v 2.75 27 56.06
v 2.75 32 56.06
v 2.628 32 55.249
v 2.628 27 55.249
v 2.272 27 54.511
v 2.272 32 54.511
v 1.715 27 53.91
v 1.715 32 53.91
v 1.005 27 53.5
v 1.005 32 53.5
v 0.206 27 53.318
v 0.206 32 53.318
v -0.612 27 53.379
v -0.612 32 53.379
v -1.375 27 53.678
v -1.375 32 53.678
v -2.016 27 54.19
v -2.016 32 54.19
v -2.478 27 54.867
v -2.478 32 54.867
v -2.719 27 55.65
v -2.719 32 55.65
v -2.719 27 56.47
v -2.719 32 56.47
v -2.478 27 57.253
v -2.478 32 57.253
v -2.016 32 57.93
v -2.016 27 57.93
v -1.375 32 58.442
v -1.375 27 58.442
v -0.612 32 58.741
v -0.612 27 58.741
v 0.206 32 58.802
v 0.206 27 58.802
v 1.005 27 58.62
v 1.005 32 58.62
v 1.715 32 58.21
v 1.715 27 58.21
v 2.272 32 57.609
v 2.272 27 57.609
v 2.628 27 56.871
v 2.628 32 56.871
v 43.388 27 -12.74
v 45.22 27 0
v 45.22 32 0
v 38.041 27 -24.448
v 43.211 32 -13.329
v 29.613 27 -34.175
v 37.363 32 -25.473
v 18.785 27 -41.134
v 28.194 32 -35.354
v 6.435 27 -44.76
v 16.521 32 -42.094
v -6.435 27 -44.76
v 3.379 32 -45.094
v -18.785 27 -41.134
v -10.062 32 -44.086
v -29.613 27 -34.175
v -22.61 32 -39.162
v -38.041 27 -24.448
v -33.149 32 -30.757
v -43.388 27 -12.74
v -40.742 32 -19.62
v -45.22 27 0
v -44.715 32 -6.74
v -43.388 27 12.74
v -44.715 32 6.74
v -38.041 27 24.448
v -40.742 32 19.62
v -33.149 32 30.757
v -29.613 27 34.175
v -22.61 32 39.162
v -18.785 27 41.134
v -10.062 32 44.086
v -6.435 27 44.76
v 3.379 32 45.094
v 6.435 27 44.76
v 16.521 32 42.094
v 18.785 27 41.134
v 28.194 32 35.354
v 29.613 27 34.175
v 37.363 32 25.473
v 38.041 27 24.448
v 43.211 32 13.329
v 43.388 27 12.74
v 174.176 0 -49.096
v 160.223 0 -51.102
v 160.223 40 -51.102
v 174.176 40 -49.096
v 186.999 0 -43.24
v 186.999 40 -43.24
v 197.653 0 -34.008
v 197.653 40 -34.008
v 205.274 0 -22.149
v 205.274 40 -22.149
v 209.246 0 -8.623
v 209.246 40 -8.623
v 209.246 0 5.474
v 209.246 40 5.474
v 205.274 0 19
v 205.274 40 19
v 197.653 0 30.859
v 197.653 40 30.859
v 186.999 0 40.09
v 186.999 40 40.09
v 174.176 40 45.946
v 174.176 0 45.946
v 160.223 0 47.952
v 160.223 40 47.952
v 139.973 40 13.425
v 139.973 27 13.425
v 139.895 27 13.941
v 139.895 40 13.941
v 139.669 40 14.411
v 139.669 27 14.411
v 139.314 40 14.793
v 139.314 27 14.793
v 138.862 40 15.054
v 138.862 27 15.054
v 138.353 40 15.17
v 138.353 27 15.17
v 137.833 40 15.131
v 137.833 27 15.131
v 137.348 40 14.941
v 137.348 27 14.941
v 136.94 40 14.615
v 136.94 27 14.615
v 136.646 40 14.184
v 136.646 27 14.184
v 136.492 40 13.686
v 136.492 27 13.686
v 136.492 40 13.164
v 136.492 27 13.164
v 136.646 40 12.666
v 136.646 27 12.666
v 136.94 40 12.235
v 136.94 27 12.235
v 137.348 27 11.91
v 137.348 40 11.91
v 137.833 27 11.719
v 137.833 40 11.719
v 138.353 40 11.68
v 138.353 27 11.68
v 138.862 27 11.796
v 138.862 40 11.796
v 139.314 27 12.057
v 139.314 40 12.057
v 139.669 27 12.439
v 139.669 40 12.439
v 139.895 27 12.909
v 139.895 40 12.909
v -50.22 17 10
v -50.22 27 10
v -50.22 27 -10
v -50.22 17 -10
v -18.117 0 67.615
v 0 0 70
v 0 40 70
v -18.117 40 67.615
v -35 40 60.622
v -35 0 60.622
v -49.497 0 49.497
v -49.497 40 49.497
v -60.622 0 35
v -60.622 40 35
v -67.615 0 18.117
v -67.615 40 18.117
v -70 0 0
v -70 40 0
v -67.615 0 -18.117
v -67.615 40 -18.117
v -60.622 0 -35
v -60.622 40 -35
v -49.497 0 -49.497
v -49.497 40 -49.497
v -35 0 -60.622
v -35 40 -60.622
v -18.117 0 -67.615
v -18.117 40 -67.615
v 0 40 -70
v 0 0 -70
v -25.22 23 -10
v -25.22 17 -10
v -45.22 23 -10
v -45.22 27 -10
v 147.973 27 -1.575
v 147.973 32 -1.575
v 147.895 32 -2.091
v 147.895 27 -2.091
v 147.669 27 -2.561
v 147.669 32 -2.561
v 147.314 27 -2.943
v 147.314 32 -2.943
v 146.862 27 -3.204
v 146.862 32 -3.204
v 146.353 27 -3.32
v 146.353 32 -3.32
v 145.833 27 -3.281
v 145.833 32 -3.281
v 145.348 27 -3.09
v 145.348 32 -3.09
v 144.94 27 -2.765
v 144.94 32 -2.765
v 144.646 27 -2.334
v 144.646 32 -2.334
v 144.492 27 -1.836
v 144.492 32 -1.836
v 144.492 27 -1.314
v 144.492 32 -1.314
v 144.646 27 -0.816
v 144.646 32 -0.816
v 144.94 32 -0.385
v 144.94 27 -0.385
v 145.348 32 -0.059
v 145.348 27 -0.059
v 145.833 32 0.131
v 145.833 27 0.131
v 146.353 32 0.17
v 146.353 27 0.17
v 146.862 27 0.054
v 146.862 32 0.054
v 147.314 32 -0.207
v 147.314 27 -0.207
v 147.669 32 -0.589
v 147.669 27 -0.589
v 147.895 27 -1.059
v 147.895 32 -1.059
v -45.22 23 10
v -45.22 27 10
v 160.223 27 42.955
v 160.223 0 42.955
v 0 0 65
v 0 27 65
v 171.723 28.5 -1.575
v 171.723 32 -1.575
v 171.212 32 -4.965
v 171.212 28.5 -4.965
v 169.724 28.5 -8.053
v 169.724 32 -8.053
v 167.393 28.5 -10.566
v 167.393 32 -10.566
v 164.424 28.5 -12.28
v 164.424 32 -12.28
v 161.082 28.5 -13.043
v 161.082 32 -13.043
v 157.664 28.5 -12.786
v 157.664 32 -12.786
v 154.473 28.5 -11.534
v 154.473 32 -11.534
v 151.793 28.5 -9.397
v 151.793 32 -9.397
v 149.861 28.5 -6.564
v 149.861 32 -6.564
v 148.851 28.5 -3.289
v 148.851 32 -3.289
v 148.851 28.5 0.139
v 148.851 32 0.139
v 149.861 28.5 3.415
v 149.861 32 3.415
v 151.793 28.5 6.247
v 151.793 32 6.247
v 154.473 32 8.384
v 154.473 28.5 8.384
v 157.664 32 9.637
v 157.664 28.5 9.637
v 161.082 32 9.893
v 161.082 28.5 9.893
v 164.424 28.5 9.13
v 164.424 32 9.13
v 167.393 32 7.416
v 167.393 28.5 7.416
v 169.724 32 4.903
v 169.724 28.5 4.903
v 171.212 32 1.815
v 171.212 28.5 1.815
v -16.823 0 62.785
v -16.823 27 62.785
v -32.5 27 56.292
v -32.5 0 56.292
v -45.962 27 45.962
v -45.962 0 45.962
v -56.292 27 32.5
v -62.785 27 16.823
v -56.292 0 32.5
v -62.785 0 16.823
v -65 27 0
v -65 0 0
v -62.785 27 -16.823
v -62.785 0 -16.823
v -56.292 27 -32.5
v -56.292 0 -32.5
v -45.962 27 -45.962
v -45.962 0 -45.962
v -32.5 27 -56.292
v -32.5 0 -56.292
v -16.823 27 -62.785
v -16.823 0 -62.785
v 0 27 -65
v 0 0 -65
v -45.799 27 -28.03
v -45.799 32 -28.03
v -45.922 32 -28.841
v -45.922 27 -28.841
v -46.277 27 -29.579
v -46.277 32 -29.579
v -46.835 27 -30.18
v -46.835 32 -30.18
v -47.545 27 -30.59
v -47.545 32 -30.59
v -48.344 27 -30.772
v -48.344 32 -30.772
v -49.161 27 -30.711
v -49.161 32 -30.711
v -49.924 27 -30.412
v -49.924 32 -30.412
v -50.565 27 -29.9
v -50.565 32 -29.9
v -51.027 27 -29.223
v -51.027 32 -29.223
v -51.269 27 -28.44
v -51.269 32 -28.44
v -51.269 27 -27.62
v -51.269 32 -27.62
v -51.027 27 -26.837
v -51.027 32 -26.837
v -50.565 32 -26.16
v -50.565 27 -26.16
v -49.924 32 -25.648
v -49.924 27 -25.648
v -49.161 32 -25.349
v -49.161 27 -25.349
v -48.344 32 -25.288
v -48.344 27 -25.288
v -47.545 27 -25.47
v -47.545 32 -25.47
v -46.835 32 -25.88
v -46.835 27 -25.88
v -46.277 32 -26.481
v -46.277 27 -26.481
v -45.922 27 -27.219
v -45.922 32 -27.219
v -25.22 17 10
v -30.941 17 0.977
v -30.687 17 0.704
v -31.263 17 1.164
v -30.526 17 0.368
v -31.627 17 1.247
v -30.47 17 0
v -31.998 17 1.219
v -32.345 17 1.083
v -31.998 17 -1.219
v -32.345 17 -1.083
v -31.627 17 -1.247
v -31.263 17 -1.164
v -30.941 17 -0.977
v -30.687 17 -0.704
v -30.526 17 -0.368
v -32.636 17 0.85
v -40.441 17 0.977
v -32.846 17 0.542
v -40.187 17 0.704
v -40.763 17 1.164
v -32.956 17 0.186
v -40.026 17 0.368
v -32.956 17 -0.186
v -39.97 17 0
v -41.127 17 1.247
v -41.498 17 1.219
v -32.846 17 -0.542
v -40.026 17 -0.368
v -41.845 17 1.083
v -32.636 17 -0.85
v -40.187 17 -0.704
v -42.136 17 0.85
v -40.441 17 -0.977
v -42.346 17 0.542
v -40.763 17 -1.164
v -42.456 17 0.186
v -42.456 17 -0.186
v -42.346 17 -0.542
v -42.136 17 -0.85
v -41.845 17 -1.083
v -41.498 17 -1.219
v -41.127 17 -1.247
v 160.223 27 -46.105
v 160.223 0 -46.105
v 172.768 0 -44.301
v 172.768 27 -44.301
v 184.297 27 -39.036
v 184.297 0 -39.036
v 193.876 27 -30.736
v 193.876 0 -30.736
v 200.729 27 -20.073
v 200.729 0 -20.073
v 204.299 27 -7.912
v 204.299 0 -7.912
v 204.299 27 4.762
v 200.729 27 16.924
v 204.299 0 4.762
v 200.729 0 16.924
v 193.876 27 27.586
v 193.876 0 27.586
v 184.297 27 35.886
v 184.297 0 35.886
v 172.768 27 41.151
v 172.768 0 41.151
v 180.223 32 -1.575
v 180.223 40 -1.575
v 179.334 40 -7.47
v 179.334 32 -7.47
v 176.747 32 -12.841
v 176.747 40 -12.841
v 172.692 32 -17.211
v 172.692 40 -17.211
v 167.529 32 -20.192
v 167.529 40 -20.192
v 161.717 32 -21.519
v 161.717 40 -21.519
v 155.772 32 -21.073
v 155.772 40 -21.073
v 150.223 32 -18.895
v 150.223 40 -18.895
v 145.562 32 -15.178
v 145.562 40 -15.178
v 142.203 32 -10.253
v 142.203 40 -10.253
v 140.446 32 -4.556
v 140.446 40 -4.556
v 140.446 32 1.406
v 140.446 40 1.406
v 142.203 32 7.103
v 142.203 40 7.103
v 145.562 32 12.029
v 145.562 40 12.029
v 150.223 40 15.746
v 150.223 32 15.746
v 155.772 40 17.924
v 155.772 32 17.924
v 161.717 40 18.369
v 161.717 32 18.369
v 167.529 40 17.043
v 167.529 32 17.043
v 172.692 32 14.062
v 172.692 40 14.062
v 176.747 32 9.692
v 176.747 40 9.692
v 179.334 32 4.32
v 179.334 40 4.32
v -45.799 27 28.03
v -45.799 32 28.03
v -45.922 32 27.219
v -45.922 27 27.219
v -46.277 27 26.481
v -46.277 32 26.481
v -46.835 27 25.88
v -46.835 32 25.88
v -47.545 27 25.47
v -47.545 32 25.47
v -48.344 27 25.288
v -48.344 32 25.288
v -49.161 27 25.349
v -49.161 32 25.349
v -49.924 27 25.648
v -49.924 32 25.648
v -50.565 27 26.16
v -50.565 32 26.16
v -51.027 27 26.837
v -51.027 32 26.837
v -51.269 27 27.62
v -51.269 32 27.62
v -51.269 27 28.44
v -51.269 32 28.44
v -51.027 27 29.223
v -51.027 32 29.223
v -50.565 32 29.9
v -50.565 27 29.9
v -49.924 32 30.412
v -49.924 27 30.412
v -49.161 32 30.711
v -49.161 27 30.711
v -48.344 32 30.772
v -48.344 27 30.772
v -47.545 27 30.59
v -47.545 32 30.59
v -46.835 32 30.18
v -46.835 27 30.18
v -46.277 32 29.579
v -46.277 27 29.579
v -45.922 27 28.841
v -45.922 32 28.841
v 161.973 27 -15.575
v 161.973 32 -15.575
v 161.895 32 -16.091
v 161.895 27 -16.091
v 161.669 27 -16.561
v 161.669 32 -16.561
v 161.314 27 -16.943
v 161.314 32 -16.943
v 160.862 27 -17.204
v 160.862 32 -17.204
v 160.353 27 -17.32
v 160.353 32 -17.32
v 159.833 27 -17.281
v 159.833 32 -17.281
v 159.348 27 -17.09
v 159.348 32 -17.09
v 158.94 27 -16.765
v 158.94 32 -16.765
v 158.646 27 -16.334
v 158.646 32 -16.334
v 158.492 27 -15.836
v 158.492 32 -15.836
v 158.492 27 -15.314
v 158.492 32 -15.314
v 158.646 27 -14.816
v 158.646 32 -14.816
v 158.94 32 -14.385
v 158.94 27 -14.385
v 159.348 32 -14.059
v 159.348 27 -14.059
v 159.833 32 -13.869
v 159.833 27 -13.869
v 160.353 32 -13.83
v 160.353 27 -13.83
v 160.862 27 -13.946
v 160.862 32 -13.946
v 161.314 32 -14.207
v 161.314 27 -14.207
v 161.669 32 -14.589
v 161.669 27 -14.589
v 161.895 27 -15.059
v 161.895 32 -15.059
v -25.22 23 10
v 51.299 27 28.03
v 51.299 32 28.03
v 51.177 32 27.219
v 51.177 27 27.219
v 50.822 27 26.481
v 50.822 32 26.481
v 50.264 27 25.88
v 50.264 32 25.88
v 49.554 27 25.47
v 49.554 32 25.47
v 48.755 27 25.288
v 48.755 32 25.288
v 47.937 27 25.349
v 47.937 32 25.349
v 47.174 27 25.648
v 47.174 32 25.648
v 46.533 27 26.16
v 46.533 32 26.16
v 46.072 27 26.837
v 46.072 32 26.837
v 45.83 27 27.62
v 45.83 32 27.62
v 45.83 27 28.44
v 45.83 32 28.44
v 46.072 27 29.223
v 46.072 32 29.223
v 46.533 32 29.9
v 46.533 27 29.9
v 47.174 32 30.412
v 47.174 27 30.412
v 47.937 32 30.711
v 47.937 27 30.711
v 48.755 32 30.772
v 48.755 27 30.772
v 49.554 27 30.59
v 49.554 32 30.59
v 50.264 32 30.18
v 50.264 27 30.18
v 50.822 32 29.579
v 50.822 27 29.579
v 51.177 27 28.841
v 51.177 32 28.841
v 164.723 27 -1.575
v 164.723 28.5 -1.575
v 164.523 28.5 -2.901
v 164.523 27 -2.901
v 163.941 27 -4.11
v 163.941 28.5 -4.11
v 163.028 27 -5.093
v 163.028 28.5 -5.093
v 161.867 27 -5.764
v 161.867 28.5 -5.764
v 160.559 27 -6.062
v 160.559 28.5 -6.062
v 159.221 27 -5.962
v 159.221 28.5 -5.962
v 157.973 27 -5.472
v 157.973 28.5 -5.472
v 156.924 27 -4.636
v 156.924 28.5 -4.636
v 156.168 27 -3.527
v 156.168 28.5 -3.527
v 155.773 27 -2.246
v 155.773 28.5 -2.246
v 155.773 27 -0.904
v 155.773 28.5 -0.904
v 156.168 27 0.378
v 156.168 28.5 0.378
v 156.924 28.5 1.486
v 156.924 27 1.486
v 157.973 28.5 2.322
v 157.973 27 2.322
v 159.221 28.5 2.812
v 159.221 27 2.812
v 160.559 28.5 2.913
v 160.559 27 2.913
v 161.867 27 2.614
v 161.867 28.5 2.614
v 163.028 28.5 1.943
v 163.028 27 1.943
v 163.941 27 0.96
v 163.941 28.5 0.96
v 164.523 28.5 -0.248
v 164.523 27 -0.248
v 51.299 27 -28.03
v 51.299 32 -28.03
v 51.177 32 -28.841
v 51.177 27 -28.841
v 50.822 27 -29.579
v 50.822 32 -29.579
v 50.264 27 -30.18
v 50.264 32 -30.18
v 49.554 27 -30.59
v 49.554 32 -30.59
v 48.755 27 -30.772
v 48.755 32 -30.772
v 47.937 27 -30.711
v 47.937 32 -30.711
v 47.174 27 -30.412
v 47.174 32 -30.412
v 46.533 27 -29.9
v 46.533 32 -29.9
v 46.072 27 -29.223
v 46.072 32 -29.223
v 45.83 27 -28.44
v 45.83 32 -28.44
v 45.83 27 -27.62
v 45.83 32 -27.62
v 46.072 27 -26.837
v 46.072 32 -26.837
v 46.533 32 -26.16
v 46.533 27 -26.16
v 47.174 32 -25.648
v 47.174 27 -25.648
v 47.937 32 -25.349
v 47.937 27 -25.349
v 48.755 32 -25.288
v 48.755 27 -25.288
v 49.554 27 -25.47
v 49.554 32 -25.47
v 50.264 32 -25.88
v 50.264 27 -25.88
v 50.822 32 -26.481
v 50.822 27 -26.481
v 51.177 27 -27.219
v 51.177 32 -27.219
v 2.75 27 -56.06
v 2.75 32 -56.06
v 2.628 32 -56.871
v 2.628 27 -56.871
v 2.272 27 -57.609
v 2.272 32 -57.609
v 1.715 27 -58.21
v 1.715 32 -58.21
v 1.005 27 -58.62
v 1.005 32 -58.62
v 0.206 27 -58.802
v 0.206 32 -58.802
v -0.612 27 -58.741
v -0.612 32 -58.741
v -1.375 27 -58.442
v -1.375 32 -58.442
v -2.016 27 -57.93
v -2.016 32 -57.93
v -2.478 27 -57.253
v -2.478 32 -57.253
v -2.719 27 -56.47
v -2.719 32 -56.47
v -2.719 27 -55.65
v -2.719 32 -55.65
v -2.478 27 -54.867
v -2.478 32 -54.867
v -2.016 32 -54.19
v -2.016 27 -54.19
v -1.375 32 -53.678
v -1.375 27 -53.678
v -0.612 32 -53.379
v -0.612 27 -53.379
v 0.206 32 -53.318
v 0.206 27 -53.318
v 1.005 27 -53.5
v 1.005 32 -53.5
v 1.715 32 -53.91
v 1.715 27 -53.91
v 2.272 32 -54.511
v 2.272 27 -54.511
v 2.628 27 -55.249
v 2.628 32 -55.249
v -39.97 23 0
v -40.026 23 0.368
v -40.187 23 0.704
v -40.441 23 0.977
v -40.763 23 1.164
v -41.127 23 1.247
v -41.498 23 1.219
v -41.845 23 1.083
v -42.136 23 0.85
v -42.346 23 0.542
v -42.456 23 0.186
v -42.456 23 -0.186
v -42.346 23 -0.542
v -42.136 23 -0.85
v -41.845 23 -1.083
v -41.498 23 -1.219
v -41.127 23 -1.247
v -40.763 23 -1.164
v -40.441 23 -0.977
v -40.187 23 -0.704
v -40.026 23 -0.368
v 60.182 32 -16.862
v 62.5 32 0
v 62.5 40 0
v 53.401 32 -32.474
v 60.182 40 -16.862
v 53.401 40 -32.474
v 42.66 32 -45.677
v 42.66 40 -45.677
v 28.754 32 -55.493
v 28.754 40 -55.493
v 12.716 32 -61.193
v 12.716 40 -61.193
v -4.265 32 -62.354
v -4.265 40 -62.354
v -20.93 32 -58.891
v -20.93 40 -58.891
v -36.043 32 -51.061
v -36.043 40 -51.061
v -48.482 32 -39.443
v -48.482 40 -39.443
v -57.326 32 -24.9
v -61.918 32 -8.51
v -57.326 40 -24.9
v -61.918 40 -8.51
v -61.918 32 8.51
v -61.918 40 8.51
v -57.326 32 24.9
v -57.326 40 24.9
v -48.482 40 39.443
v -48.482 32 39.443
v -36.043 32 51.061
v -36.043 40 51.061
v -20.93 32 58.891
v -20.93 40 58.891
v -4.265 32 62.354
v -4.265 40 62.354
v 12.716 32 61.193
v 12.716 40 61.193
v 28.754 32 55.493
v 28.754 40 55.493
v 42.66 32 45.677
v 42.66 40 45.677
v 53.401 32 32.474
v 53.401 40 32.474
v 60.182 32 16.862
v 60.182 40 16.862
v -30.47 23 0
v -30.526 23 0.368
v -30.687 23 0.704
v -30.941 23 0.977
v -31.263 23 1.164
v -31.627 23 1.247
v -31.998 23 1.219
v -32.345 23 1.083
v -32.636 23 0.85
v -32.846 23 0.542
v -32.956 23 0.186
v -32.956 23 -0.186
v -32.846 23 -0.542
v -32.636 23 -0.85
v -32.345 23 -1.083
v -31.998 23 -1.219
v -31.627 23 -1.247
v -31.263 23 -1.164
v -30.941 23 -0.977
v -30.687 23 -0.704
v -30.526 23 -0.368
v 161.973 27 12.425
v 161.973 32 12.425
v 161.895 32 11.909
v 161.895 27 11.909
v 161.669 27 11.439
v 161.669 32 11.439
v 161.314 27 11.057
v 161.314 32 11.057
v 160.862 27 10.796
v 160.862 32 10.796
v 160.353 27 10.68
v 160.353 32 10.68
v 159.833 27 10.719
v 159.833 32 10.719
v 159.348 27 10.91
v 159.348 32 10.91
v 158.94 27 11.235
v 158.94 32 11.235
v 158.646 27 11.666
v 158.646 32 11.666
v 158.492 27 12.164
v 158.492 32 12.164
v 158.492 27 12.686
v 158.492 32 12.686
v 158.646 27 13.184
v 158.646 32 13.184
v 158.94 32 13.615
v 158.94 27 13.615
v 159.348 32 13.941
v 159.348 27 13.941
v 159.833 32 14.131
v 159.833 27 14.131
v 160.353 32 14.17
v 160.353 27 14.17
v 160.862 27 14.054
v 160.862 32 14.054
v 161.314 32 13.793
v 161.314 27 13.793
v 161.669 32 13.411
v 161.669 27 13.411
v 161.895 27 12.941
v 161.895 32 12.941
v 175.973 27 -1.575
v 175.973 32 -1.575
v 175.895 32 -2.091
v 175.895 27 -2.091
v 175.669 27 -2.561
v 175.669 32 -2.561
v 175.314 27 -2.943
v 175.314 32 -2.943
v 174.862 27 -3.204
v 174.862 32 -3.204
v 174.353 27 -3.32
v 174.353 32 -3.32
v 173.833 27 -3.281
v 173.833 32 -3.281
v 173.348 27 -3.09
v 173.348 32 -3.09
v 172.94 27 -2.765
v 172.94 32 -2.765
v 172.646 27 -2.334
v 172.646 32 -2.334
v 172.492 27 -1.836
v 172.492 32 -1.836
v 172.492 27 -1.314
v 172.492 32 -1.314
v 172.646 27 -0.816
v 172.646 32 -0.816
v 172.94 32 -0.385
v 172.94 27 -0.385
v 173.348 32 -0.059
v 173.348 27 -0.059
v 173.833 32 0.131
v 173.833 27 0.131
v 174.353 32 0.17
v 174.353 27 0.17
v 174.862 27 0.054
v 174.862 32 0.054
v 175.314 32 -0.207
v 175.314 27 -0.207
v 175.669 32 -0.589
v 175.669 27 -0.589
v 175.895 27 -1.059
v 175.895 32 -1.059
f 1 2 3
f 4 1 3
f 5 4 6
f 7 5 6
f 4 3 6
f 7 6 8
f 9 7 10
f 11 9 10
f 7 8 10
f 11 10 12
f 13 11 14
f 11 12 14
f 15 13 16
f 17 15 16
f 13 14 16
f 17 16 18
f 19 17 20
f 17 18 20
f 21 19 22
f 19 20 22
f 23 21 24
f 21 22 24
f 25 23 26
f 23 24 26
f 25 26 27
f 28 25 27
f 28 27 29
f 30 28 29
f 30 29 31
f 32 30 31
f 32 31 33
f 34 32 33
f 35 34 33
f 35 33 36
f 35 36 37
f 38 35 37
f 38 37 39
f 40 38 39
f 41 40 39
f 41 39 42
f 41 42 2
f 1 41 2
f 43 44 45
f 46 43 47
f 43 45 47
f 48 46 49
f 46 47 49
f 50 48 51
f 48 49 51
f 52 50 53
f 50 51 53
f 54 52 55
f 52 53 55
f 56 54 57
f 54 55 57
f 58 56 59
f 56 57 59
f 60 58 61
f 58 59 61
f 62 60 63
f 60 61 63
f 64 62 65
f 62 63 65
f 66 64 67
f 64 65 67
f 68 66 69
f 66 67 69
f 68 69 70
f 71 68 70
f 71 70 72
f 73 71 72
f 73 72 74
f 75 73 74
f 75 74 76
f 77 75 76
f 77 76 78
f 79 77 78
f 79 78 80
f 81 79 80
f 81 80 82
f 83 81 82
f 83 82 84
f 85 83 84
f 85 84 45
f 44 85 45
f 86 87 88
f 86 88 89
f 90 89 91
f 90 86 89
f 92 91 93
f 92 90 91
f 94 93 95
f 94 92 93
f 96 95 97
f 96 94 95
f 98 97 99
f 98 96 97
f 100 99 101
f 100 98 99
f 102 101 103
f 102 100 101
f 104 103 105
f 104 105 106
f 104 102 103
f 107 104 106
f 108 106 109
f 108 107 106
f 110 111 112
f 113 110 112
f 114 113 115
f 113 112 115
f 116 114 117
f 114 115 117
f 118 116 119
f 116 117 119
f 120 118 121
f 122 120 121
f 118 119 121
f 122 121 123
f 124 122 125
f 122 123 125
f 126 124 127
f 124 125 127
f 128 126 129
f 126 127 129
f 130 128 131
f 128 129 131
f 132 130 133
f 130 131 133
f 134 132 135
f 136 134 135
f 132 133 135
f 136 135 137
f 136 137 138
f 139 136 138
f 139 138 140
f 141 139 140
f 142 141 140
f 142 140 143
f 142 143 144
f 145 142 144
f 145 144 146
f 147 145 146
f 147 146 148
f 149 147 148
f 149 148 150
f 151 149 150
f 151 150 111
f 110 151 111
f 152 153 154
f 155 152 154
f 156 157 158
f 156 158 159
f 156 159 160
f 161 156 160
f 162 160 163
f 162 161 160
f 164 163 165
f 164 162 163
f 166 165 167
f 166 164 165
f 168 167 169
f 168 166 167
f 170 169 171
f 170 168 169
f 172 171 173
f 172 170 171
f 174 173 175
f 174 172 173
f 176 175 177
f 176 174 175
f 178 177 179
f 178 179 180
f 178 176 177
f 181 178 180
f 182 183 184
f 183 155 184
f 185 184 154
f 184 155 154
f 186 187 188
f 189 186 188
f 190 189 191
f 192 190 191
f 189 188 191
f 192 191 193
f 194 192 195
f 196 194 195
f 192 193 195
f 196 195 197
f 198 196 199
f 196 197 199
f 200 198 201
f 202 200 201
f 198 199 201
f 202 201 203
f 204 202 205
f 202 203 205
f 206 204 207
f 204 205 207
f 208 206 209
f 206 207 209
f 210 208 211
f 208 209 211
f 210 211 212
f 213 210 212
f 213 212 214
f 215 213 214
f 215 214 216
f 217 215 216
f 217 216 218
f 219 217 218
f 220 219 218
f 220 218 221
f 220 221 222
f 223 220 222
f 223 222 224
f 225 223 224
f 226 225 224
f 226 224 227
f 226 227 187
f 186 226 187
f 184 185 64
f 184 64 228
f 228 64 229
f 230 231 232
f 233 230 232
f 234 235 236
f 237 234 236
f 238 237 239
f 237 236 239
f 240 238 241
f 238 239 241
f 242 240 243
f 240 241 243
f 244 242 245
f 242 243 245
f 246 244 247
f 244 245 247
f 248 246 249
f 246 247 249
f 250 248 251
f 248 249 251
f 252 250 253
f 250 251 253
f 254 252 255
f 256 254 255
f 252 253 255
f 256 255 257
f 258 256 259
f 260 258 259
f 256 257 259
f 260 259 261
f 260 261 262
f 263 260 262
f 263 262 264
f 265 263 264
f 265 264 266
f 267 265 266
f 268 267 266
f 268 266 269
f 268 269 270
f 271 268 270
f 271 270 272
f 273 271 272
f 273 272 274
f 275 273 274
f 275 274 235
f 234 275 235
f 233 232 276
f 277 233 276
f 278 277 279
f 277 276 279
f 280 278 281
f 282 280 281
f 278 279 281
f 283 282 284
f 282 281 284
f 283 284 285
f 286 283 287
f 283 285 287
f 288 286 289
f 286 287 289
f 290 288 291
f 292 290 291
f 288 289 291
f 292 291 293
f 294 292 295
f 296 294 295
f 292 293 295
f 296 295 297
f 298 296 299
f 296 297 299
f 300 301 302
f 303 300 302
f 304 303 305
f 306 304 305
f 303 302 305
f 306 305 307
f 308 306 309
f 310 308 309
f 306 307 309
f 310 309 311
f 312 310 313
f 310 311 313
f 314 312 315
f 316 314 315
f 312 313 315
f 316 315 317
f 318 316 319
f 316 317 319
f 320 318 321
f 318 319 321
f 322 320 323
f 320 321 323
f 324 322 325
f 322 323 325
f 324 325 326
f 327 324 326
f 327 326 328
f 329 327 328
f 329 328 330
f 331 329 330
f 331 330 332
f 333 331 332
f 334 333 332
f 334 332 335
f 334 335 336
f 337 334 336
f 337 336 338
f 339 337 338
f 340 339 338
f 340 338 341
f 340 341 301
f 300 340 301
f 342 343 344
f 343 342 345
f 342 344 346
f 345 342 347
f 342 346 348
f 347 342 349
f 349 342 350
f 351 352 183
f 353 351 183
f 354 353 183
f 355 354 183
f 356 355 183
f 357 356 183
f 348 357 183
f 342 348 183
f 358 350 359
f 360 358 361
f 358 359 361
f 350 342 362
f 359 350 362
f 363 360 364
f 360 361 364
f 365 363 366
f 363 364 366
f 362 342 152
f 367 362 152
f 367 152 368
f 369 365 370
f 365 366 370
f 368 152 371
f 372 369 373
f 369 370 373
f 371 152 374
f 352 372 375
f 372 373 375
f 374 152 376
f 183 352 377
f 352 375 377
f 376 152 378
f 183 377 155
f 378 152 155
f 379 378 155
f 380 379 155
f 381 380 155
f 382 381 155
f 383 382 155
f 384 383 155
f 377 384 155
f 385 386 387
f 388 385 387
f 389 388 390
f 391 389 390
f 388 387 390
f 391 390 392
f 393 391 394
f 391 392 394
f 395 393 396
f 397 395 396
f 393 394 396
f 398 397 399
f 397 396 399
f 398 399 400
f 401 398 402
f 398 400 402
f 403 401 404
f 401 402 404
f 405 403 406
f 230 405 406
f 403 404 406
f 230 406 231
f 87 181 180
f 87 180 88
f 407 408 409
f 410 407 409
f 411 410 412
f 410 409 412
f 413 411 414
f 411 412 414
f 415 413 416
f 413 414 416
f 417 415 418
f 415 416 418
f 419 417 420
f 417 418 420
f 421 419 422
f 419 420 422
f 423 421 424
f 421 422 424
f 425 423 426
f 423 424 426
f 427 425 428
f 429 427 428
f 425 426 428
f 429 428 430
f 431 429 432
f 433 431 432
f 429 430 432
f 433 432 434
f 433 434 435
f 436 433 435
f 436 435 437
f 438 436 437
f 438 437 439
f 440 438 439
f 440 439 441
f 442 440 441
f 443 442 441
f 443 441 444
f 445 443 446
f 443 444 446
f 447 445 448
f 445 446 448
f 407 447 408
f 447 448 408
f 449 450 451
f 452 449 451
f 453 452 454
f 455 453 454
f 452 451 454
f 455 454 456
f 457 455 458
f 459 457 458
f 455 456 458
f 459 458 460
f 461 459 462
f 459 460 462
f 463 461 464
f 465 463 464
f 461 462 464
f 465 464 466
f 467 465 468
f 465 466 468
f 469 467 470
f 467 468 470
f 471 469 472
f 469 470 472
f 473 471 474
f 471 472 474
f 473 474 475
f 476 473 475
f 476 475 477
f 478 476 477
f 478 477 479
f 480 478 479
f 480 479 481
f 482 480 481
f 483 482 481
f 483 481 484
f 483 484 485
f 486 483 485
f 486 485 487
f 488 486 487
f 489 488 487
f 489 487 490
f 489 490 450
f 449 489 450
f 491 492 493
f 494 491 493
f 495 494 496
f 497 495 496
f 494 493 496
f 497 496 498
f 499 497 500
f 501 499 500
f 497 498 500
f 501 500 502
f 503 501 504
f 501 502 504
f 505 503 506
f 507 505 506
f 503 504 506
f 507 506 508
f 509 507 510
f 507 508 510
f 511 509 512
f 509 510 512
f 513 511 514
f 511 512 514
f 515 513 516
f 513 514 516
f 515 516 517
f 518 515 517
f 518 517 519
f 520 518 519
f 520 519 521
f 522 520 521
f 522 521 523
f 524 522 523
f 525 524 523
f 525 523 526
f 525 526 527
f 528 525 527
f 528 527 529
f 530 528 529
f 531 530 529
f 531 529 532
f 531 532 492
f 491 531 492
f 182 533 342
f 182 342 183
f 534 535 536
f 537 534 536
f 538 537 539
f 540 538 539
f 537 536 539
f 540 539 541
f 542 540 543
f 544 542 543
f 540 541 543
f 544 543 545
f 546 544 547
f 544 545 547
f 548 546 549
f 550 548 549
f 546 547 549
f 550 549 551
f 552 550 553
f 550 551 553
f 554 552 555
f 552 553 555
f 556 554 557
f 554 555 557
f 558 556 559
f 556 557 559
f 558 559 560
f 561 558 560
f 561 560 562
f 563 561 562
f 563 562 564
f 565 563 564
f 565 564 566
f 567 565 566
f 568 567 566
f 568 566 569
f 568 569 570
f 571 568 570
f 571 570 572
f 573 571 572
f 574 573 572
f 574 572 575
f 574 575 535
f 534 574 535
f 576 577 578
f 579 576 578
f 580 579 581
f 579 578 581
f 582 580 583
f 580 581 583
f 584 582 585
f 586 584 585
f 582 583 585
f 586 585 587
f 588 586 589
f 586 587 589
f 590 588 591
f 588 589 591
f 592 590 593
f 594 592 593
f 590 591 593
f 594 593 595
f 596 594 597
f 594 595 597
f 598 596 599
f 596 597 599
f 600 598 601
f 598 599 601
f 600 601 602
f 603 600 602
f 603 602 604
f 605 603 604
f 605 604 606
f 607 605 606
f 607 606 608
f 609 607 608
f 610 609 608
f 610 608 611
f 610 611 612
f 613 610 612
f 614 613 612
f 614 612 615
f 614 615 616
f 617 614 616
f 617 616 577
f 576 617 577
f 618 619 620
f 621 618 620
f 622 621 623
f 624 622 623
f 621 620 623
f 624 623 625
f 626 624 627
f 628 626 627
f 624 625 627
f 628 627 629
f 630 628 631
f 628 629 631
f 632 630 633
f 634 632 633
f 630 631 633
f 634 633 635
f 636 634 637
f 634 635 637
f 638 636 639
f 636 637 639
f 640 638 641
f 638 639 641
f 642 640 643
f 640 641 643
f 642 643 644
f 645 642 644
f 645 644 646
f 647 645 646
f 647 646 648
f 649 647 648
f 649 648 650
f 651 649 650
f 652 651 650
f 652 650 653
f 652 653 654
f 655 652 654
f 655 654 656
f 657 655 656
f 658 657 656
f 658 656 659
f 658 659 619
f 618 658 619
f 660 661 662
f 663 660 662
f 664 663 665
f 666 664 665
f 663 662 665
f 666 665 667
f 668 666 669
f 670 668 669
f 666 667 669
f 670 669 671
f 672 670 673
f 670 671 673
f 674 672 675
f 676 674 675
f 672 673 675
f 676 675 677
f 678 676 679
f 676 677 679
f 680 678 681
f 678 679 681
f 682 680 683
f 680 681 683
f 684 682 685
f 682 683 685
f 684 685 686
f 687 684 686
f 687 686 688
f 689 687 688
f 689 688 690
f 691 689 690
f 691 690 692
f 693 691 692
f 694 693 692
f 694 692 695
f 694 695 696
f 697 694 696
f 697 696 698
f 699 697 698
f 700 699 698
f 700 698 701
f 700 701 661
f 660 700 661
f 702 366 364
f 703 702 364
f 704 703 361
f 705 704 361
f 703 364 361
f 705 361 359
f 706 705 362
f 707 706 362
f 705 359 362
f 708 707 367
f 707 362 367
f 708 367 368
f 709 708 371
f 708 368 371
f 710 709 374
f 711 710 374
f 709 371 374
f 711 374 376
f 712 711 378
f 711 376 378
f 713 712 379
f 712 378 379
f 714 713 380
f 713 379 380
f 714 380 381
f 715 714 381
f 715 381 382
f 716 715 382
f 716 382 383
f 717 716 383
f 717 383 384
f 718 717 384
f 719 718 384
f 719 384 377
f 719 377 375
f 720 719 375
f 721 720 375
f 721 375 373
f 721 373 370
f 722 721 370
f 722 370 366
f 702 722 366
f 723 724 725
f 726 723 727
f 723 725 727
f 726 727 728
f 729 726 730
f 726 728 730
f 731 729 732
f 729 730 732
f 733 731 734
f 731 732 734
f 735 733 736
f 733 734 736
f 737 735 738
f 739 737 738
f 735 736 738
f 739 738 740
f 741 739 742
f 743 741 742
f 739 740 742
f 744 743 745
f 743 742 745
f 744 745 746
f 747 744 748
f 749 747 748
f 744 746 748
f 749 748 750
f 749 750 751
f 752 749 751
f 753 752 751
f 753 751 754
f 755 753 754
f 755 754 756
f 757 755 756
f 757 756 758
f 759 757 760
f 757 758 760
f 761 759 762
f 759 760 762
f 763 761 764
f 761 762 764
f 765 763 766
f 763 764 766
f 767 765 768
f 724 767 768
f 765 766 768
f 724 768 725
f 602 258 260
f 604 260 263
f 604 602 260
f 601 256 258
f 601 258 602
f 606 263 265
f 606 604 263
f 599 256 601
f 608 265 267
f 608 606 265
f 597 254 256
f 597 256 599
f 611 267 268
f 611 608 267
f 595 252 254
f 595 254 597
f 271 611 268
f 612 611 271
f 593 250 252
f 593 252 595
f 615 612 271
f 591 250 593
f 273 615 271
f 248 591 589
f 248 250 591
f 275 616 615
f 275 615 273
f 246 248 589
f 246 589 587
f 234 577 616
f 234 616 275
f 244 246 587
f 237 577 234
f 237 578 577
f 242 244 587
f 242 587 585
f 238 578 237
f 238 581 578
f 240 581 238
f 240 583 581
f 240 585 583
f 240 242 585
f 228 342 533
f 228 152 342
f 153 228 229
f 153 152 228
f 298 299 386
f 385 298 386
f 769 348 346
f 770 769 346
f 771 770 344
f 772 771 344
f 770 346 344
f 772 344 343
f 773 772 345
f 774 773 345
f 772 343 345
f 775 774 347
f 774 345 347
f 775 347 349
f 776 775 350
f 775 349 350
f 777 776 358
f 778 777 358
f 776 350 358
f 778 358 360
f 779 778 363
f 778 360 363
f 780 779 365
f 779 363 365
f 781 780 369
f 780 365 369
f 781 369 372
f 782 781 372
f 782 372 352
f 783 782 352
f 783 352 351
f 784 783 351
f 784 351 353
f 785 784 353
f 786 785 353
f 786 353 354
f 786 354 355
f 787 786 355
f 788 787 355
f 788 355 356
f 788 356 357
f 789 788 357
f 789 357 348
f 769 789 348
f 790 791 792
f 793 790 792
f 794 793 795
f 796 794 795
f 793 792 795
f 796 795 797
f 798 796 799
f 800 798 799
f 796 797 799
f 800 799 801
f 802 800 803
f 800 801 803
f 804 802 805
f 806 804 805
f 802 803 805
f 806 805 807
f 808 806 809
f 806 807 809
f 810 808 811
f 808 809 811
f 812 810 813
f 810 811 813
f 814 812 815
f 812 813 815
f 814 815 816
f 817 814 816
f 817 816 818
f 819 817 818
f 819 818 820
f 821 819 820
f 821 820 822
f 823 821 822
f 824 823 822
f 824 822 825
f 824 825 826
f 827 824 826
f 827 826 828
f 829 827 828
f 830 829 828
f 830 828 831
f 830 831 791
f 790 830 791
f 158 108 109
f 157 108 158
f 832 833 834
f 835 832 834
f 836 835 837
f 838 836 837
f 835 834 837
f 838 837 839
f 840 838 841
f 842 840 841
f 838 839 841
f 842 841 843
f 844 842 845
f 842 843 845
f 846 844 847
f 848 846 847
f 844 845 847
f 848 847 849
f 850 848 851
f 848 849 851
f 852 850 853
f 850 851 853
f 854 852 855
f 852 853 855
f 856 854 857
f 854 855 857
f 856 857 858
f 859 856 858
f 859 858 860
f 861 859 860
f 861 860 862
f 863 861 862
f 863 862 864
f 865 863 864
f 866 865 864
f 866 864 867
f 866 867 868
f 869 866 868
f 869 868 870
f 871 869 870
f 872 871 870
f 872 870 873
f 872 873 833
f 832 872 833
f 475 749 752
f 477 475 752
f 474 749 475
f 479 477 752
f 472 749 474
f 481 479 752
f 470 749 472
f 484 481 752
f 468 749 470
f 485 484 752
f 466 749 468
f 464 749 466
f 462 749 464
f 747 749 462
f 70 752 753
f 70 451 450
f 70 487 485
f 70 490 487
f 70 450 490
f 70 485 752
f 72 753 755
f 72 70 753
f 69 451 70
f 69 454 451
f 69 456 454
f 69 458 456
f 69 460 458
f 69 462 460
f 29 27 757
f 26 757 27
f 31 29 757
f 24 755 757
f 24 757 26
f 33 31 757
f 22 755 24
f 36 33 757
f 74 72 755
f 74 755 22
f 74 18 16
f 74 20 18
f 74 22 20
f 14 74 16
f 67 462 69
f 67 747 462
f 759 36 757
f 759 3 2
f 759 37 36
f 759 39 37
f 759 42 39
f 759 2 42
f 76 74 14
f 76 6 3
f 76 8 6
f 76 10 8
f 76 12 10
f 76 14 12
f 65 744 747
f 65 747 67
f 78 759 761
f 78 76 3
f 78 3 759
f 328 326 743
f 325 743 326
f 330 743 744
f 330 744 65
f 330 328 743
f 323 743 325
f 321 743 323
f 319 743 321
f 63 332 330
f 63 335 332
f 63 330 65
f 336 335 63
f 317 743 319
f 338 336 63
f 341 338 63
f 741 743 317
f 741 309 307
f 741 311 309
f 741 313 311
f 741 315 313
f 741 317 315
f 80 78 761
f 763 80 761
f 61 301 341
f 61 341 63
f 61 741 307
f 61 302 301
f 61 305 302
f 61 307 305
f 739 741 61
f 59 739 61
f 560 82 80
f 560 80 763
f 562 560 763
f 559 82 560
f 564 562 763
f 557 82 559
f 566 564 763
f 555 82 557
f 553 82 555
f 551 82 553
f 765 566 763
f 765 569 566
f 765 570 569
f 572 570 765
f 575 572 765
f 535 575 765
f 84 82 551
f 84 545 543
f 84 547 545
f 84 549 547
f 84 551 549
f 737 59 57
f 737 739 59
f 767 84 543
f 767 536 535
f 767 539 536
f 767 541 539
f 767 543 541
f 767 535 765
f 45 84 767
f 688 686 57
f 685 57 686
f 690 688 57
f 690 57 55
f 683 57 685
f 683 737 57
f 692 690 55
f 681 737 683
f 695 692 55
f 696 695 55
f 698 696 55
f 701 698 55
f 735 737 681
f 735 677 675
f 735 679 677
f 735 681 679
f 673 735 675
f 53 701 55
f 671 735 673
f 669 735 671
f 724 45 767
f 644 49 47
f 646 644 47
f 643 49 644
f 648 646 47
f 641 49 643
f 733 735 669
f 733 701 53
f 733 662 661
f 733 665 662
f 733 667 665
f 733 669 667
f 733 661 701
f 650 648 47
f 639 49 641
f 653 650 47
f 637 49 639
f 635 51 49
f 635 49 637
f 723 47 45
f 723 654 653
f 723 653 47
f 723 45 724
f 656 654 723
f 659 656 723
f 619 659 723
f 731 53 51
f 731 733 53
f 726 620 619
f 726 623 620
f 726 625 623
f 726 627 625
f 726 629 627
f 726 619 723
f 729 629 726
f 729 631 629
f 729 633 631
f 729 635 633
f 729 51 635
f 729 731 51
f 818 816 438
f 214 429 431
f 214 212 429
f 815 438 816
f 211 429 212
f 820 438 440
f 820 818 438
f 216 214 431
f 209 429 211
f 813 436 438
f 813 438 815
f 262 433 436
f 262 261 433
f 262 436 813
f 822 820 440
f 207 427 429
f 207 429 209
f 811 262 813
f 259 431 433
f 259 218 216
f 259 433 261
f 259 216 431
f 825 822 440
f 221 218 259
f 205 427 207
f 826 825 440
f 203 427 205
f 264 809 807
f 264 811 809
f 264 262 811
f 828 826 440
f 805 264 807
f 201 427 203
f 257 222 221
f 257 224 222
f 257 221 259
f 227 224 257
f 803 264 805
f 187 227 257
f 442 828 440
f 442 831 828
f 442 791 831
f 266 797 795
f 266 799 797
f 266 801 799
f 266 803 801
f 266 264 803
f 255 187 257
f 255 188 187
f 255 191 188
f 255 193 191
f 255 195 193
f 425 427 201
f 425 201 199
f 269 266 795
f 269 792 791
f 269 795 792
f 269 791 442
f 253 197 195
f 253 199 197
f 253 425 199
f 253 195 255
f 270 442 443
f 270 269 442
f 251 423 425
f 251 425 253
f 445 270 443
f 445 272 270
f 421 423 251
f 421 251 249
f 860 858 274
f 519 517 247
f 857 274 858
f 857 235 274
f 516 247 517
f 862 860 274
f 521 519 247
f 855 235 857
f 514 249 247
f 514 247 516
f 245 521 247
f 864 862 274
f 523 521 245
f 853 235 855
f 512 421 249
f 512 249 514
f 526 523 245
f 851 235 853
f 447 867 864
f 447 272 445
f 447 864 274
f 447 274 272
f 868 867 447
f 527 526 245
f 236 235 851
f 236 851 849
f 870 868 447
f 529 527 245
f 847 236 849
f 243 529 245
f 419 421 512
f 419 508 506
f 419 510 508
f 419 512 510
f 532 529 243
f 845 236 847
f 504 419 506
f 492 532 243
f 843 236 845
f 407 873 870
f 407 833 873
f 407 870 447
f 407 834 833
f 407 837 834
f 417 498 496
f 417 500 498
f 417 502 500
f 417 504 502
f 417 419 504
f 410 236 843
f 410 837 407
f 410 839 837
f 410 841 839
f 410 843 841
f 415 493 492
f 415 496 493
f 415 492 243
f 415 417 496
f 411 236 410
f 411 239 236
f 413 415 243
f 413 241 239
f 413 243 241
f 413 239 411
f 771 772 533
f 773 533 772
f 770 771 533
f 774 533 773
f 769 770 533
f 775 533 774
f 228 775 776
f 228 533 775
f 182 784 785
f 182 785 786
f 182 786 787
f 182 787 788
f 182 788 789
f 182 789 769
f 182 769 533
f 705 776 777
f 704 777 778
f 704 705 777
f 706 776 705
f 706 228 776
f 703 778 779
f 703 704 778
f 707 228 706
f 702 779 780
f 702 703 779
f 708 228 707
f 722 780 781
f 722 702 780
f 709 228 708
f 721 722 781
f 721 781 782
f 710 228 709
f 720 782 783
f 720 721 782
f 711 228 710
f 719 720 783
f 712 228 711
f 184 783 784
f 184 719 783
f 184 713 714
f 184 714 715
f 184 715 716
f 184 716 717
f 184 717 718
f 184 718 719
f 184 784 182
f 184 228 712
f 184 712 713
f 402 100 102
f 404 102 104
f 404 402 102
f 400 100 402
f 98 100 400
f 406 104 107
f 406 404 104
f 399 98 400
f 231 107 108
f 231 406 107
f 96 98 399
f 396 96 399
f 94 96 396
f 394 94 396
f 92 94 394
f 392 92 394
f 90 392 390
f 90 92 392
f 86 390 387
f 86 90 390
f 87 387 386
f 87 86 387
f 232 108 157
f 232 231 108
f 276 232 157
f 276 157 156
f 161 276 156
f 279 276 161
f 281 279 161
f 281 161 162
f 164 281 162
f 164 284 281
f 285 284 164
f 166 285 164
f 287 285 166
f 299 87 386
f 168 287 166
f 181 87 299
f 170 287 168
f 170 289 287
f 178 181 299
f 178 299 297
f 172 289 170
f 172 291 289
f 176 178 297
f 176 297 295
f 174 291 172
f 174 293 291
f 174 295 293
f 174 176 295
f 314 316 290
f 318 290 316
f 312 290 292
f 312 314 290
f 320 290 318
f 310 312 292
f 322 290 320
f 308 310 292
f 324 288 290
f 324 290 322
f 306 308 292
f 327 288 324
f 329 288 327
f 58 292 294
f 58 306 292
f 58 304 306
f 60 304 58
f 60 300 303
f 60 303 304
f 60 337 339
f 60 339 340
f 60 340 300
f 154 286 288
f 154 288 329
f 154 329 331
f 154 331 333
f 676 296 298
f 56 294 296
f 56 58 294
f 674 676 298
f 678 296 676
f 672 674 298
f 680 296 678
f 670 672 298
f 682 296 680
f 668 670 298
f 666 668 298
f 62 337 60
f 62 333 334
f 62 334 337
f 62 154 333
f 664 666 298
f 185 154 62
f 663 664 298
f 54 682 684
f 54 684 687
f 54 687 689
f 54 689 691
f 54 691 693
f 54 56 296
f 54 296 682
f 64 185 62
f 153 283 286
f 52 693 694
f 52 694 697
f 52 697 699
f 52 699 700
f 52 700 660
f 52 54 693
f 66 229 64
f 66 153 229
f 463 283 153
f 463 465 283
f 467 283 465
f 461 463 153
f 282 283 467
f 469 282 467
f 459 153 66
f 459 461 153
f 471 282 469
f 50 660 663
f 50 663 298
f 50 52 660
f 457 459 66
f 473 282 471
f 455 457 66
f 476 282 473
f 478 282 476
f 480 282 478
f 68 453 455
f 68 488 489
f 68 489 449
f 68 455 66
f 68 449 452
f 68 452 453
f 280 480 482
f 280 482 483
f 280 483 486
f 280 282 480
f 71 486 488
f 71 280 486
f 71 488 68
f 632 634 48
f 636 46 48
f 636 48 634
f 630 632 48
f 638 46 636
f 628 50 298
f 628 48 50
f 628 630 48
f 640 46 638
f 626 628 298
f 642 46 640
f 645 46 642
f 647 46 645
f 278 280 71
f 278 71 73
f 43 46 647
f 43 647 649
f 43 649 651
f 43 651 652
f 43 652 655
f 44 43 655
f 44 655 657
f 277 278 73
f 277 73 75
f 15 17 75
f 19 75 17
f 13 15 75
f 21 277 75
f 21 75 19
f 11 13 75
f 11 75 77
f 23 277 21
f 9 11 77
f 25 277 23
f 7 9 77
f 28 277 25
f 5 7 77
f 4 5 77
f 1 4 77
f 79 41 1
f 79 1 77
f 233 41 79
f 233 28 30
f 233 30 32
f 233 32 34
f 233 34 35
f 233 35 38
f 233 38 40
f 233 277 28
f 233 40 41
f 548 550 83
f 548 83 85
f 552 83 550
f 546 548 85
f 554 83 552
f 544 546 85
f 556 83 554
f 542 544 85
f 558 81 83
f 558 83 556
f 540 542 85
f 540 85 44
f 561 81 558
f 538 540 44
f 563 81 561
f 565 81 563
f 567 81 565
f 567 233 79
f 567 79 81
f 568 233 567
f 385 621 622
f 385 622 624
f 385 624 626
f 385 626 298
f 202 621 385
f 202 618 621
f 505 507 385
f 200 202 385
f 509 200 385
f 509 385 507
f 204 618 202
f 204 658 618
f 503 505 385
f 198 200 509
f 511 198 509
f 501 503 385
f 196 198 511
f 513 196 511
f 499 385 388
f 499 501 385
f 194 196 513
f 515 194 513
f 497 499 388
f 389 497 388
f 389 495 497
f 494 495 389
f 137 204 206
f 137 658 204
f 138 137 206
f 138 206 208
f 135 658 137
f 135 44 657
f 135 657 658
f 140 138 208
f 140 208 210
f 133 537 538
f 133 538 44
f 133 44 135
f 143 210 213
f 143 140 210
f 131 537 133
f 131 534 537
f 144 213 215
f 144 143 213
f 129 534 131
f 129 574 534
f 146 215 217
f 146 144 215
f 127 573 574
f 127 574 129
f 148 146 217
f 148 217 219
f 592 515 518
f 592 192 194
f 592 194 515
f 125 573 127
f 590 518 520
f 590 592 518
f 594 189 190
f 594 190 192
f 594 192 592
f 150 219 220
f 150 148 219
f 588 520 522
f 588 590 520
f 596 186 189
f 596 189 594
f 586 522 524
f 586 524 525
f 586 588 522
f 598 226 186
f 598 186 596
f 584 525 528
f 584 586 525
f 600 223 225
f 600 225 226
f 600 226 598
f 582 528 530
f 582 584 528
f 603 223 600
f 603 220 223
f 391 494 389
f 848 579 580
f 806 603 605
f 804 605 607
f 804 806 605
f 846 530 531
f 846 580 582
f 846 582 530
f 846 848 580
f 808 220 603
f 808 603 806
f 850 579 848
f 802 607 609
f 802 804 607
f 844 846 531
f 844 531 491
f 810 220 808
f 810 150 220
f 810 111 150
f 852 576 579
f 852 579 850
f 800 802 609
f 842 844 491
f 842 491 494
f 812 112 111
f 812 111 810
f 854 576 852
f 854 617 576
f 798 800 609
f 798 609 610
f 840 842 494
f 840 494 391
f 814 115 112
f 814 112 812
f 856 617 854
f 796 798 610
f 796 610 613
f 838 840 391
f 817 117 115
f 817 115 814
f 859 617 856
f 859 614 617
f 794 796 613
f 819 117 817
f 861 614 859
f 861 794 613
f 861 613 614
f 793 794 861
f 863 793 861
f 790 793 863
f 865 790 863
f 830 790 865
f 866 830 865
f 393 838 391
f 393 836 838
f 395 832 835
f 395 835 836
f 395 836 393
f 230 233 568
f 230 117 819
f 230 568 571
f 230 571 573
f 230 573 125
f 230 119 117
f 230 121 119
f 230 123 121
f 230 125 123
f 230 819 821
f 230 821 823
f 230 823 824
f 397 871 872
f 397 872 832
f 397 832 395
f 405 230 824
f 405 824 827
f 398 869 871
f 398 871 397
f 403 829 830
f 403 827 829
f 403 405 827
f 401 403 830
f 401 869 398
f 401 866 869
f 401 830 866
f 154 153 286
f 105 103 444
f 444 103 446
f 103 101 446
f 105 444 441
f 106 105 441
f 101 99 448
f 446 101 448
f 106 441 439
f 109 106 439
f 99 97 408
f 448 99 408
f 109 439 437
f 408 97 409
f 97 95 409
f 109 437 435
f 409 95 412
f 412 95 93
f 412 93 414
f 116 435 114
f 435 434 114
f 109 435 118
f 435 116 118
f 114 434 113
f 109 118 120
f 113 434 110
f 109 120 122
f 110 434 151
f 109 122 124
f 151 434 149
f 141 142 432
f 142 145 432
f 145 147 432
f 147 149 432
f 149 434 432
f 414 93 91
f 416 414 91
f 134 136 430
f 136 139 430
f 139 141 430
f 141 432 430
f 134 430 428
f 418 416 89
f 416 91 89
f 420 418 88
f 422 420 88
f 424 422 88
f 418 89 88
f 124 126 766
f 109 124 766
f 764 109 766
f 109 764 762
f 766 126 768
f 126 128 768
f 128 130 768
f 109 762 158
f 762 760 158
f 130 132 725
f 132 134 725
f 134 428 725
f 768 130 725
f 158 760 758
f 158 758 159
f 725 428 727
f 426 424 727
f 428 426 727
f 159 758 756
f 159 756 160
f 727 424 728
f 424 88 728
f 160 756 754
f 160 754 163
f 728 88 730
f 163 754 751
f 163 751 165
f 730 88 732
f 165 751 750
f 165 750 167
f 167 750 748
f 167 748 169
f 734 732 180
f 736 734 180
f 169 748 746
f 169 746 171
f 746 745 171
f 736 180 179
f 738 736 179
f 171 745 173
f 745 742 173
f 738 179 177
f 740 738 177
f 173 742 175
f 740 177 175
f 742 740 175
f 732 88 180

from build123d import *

# Parameters (mm, degrees)
BOSS_EXTRUDE1_DEPTH = 40
SKETCH2_R           = 45.22
SKETCH2_R_2         = 2.75
CUT_EXTRUDE1_DEPTH  = 28
SKETCH4_R           = 62.5
CUT_EXTRUDE2_DEPTH  = 8
CUT_EXTRUDE3_DEPTH  = 27
SKETCH6_R           = 1.75
SKETCH6_R_2         = 4.5
CUT_EXTRUDE4_DEPTH  = 23
SKETCH6_3_R         = 11.5
SKETCH6_3_R_2       = 4.5
CUT_EXTRUDE5_DEPTH  = 11.5
BOSS_EXTRUDE2_DEPTH = 10
SKETCH8_W           = 20
SKETCH8_H           = 6
BOSS_EXTRUDE3_DEPTH = 20
SKETCH9_R           = 1.25
CUT_EXTRUDE6_DEPTH  = 20
SKETCH6_4_R         = 20
SKETCH6_4_R_2       = 1.75
SKETCH6_4_R_3       = 4.5
CUT_EXTRUDE7_DEPTH  = 8
CUT_EXTRUDE8_START  = -168
SKETCH11_R          = 4.5
SKETCH11_R_2        = 1.75
CUT_EXTRUDE8_DEPTH  = 168


with BuildPart() as part:
    # Sketch1 → Boss-Extrude1 (new body)
    with BuildSketch(Plane(origin=(0, 0, 0), x_dir=(1, 0, 0), z_dir=(0, 1, 0))):
        with BuildLine():
            Line((0, 70), (160.2226, 51.102080384))
            ThreePointArc((160.2226, 51.102080384), (209.74985375, 1.574826635), (160.2226, -47.952427115))
            Line((160.2226, -47.952427115), (0, -70))
            ThreePointArc((0, -70), (-70, 0), (0, 70))
        make_face()
    extrude(amount=BOSS_EXTRUDE1_DEPTH)

    # Sketch2 → Cut-Extrude1 (cut)
    with BuildSketch(Plane(origin=(0, 40, 0), x_dir=(1, 0, 0), z_dir=(0, 1, 0))):
        Circle(SKETCH2_R)
        with Locations((0, 56.06)):
            Circle(SKETCH2_R_2)
        with Locations((-48.549384136, 28.03)):
            Circle(SKETCH2_R_2)
        with Locations((-48.549384136, -28.03)):
            Circle(SKETCH2_R_2)
        with Locations((0, -56.06)):
            Circle(SKETCH2_R_2)
        with Locations((48.549384136, -28.03)):
            Circle(SKETCH2_R_2)
        with Locations((48.549384136, 28.03)):
            Circle(SKETCH2_R_2)
    extrude(amount=-CUT_EXTRUDE1_DEPTH, mode=Mode.SUBTRACT)

    # Sketch4 → Cut-Extrude2 (cut)
    with BuildSketch(Plane(origin=(0, 40, 0), x_dir=(1, 0, 0), z_dir=(0, 1, 0))):
        Circle(SKETCH4_R)
    extrude(amount=-CUT_EXTRUDE2_DEPTH, mode=Mode.SUBTRACT)

    # Sketch5 → Cut-Extrude3 (cut)
    with BuildSketch(Plane.XZ):
        with BuildLine():
            Line((160.2226, 42.955173365), (0, 65))
            ThreePointArc((0, 65), (-65, 0), (0, -65))
            Line((0, -65), (160.2226, -46.104826635))
            ThreePointArc((160.2226, -46.104826635), (204.7526, -1.574826635), (160.2226, 42.955173365))
        make_face()
    extrude(amount=-CUT_EXTRUDE3_DEPTH, mode=Mode.SUBTRACT)

    # Sketch6 → Cut-Extrude4 (cut)
    with BuildSketch(Plane(origin=(0, 40, 0), x_dir=(1, 0, 0), z_dir=(0, 1, 0))):
        with Locations((174.2226, 1.574826635)):
            Circle(SKETCH6_R)
        with Locations((160.2226, 15.574826635)):
            Circle(SKETCH6_R)
        with Locations((160.2226, -12.425173365)):
            Circle(SKETCH6_R)
        with Locations((146.2226, 1.574826635)):
            Circle(SKETCH6_R)
        with Locations((160.2226, 1.574826635)):
            Circle(SKETCH6_R_2)
    extrude(amount=-CUT_EXTRUDE4_DEPTH, mode=Mode.SUBTRACT)

    # Sketch6<3> → Cut-Extrude5 (cut)
    with BuildSketch(Plane(origin=(0, 40, 0), x_dir=(1, 0, 0), z_dir=(0, 1, 0))):
        with Locations((160.2226, 1.574826635)):
            Circle(SKETCH6_3_R)
        with Locations((160.2226, 1.574826635)):
            Circle(SKETCH6_3_R_2, mode=Mode.SUBTRACT)
    extrude(amount=-CUT_EXTRUDE5_DEPTH, mode=Mode.SUBTRACT)

    # Sketch7 → Boss-Extrude2 (add)
    with BuildSketch(Plane.XZ.offset(-27)):
        Polygon((-45.22, 0), (-45.22, 10), (-50.22, 10), (-50.22, -10), (-45.22, -10), align=None)
    extrude(amount=BOSS_EXTRUDE2_DEPTH)

    # Sketch8 → Boss-Extrude3 (add)
    with BuildSketch(Plane(origin=(-45.22, 0, 0), x_dir=(0, 0, -1), z_dir=(1, 0, 0))):
        with Locations((0, 20)):
            Rectangle(SKETCH8_W, SKETCH8_H)
    extrude(amount=BOSS_EXTRUDE3_DEPTH)

    # Sketch9 → Cut-Extrude6 (cut)
    with BuildSketch(Plane.XZ.offset(-17)):
        with Locations((-31.72, 0)):
            Circle(SKETCH9_R)
        with Locations((-41.22, 0)):
            Circle(SKETCH9_R)
    extrude(amount=-CUT_EXTRUDE6_DEPTH, mode=Mode.SUBTRACT)

    # Sketch6<4> → Cut-Extrude7 (cut)
    with BuildSketch(Plane(origin=(0, 40, 0), x_dir=(1, 0, 0), z_dir=(0, 1, 0))):
        with Locations((160.2226, 1.574826635)):
            Circle(SKETCH6_4_R)
        with Locations((174.2226, 1.574826635)):
            Circle(SKETCH6_4_R_2, mode=Mode.SUBTRACT)
        with Locations((160.2226, -12.425173365)):
            Circle(SKETCH6_4_R_2, mode=Mode.SUBTRACT)
        with Locations((146.2226, 1.574826635)):
            Circle(SKETCH6_4_R_2, mode=Mode.SUBTRACT)
        with Locations((160.2226, 15.574826635)):
            Circle(SKETCH6_4_R_2, mode=Mode.SUBTRACT)
        with Locations((160.2226, 1.574826635)):
            Circle(SKETCH6_4_R_3, mode=Mode.SUBTRACT)
    extrude(amount=-CUT_EXTRUDE7_DEPTH, mode=Mode.SUBTRACT)

    # Sketch11 → Cut-Extrude8 (cut)
    with BuildSketch(Plane.XZ.offset(-27).offset(CUT_EXTRUDE8_START)):
        with Locations((160.2226, -1.574826635)):
            Circle(SKETCH11_R)
        with Locations((138.2226, 13.425173365)):
            Circle(SKETCH11_R_2)
    extrude(amount=CUT_EXTRUDE8_DEPTH, mode=Mode.SUBTRACT)


solid = part.part
